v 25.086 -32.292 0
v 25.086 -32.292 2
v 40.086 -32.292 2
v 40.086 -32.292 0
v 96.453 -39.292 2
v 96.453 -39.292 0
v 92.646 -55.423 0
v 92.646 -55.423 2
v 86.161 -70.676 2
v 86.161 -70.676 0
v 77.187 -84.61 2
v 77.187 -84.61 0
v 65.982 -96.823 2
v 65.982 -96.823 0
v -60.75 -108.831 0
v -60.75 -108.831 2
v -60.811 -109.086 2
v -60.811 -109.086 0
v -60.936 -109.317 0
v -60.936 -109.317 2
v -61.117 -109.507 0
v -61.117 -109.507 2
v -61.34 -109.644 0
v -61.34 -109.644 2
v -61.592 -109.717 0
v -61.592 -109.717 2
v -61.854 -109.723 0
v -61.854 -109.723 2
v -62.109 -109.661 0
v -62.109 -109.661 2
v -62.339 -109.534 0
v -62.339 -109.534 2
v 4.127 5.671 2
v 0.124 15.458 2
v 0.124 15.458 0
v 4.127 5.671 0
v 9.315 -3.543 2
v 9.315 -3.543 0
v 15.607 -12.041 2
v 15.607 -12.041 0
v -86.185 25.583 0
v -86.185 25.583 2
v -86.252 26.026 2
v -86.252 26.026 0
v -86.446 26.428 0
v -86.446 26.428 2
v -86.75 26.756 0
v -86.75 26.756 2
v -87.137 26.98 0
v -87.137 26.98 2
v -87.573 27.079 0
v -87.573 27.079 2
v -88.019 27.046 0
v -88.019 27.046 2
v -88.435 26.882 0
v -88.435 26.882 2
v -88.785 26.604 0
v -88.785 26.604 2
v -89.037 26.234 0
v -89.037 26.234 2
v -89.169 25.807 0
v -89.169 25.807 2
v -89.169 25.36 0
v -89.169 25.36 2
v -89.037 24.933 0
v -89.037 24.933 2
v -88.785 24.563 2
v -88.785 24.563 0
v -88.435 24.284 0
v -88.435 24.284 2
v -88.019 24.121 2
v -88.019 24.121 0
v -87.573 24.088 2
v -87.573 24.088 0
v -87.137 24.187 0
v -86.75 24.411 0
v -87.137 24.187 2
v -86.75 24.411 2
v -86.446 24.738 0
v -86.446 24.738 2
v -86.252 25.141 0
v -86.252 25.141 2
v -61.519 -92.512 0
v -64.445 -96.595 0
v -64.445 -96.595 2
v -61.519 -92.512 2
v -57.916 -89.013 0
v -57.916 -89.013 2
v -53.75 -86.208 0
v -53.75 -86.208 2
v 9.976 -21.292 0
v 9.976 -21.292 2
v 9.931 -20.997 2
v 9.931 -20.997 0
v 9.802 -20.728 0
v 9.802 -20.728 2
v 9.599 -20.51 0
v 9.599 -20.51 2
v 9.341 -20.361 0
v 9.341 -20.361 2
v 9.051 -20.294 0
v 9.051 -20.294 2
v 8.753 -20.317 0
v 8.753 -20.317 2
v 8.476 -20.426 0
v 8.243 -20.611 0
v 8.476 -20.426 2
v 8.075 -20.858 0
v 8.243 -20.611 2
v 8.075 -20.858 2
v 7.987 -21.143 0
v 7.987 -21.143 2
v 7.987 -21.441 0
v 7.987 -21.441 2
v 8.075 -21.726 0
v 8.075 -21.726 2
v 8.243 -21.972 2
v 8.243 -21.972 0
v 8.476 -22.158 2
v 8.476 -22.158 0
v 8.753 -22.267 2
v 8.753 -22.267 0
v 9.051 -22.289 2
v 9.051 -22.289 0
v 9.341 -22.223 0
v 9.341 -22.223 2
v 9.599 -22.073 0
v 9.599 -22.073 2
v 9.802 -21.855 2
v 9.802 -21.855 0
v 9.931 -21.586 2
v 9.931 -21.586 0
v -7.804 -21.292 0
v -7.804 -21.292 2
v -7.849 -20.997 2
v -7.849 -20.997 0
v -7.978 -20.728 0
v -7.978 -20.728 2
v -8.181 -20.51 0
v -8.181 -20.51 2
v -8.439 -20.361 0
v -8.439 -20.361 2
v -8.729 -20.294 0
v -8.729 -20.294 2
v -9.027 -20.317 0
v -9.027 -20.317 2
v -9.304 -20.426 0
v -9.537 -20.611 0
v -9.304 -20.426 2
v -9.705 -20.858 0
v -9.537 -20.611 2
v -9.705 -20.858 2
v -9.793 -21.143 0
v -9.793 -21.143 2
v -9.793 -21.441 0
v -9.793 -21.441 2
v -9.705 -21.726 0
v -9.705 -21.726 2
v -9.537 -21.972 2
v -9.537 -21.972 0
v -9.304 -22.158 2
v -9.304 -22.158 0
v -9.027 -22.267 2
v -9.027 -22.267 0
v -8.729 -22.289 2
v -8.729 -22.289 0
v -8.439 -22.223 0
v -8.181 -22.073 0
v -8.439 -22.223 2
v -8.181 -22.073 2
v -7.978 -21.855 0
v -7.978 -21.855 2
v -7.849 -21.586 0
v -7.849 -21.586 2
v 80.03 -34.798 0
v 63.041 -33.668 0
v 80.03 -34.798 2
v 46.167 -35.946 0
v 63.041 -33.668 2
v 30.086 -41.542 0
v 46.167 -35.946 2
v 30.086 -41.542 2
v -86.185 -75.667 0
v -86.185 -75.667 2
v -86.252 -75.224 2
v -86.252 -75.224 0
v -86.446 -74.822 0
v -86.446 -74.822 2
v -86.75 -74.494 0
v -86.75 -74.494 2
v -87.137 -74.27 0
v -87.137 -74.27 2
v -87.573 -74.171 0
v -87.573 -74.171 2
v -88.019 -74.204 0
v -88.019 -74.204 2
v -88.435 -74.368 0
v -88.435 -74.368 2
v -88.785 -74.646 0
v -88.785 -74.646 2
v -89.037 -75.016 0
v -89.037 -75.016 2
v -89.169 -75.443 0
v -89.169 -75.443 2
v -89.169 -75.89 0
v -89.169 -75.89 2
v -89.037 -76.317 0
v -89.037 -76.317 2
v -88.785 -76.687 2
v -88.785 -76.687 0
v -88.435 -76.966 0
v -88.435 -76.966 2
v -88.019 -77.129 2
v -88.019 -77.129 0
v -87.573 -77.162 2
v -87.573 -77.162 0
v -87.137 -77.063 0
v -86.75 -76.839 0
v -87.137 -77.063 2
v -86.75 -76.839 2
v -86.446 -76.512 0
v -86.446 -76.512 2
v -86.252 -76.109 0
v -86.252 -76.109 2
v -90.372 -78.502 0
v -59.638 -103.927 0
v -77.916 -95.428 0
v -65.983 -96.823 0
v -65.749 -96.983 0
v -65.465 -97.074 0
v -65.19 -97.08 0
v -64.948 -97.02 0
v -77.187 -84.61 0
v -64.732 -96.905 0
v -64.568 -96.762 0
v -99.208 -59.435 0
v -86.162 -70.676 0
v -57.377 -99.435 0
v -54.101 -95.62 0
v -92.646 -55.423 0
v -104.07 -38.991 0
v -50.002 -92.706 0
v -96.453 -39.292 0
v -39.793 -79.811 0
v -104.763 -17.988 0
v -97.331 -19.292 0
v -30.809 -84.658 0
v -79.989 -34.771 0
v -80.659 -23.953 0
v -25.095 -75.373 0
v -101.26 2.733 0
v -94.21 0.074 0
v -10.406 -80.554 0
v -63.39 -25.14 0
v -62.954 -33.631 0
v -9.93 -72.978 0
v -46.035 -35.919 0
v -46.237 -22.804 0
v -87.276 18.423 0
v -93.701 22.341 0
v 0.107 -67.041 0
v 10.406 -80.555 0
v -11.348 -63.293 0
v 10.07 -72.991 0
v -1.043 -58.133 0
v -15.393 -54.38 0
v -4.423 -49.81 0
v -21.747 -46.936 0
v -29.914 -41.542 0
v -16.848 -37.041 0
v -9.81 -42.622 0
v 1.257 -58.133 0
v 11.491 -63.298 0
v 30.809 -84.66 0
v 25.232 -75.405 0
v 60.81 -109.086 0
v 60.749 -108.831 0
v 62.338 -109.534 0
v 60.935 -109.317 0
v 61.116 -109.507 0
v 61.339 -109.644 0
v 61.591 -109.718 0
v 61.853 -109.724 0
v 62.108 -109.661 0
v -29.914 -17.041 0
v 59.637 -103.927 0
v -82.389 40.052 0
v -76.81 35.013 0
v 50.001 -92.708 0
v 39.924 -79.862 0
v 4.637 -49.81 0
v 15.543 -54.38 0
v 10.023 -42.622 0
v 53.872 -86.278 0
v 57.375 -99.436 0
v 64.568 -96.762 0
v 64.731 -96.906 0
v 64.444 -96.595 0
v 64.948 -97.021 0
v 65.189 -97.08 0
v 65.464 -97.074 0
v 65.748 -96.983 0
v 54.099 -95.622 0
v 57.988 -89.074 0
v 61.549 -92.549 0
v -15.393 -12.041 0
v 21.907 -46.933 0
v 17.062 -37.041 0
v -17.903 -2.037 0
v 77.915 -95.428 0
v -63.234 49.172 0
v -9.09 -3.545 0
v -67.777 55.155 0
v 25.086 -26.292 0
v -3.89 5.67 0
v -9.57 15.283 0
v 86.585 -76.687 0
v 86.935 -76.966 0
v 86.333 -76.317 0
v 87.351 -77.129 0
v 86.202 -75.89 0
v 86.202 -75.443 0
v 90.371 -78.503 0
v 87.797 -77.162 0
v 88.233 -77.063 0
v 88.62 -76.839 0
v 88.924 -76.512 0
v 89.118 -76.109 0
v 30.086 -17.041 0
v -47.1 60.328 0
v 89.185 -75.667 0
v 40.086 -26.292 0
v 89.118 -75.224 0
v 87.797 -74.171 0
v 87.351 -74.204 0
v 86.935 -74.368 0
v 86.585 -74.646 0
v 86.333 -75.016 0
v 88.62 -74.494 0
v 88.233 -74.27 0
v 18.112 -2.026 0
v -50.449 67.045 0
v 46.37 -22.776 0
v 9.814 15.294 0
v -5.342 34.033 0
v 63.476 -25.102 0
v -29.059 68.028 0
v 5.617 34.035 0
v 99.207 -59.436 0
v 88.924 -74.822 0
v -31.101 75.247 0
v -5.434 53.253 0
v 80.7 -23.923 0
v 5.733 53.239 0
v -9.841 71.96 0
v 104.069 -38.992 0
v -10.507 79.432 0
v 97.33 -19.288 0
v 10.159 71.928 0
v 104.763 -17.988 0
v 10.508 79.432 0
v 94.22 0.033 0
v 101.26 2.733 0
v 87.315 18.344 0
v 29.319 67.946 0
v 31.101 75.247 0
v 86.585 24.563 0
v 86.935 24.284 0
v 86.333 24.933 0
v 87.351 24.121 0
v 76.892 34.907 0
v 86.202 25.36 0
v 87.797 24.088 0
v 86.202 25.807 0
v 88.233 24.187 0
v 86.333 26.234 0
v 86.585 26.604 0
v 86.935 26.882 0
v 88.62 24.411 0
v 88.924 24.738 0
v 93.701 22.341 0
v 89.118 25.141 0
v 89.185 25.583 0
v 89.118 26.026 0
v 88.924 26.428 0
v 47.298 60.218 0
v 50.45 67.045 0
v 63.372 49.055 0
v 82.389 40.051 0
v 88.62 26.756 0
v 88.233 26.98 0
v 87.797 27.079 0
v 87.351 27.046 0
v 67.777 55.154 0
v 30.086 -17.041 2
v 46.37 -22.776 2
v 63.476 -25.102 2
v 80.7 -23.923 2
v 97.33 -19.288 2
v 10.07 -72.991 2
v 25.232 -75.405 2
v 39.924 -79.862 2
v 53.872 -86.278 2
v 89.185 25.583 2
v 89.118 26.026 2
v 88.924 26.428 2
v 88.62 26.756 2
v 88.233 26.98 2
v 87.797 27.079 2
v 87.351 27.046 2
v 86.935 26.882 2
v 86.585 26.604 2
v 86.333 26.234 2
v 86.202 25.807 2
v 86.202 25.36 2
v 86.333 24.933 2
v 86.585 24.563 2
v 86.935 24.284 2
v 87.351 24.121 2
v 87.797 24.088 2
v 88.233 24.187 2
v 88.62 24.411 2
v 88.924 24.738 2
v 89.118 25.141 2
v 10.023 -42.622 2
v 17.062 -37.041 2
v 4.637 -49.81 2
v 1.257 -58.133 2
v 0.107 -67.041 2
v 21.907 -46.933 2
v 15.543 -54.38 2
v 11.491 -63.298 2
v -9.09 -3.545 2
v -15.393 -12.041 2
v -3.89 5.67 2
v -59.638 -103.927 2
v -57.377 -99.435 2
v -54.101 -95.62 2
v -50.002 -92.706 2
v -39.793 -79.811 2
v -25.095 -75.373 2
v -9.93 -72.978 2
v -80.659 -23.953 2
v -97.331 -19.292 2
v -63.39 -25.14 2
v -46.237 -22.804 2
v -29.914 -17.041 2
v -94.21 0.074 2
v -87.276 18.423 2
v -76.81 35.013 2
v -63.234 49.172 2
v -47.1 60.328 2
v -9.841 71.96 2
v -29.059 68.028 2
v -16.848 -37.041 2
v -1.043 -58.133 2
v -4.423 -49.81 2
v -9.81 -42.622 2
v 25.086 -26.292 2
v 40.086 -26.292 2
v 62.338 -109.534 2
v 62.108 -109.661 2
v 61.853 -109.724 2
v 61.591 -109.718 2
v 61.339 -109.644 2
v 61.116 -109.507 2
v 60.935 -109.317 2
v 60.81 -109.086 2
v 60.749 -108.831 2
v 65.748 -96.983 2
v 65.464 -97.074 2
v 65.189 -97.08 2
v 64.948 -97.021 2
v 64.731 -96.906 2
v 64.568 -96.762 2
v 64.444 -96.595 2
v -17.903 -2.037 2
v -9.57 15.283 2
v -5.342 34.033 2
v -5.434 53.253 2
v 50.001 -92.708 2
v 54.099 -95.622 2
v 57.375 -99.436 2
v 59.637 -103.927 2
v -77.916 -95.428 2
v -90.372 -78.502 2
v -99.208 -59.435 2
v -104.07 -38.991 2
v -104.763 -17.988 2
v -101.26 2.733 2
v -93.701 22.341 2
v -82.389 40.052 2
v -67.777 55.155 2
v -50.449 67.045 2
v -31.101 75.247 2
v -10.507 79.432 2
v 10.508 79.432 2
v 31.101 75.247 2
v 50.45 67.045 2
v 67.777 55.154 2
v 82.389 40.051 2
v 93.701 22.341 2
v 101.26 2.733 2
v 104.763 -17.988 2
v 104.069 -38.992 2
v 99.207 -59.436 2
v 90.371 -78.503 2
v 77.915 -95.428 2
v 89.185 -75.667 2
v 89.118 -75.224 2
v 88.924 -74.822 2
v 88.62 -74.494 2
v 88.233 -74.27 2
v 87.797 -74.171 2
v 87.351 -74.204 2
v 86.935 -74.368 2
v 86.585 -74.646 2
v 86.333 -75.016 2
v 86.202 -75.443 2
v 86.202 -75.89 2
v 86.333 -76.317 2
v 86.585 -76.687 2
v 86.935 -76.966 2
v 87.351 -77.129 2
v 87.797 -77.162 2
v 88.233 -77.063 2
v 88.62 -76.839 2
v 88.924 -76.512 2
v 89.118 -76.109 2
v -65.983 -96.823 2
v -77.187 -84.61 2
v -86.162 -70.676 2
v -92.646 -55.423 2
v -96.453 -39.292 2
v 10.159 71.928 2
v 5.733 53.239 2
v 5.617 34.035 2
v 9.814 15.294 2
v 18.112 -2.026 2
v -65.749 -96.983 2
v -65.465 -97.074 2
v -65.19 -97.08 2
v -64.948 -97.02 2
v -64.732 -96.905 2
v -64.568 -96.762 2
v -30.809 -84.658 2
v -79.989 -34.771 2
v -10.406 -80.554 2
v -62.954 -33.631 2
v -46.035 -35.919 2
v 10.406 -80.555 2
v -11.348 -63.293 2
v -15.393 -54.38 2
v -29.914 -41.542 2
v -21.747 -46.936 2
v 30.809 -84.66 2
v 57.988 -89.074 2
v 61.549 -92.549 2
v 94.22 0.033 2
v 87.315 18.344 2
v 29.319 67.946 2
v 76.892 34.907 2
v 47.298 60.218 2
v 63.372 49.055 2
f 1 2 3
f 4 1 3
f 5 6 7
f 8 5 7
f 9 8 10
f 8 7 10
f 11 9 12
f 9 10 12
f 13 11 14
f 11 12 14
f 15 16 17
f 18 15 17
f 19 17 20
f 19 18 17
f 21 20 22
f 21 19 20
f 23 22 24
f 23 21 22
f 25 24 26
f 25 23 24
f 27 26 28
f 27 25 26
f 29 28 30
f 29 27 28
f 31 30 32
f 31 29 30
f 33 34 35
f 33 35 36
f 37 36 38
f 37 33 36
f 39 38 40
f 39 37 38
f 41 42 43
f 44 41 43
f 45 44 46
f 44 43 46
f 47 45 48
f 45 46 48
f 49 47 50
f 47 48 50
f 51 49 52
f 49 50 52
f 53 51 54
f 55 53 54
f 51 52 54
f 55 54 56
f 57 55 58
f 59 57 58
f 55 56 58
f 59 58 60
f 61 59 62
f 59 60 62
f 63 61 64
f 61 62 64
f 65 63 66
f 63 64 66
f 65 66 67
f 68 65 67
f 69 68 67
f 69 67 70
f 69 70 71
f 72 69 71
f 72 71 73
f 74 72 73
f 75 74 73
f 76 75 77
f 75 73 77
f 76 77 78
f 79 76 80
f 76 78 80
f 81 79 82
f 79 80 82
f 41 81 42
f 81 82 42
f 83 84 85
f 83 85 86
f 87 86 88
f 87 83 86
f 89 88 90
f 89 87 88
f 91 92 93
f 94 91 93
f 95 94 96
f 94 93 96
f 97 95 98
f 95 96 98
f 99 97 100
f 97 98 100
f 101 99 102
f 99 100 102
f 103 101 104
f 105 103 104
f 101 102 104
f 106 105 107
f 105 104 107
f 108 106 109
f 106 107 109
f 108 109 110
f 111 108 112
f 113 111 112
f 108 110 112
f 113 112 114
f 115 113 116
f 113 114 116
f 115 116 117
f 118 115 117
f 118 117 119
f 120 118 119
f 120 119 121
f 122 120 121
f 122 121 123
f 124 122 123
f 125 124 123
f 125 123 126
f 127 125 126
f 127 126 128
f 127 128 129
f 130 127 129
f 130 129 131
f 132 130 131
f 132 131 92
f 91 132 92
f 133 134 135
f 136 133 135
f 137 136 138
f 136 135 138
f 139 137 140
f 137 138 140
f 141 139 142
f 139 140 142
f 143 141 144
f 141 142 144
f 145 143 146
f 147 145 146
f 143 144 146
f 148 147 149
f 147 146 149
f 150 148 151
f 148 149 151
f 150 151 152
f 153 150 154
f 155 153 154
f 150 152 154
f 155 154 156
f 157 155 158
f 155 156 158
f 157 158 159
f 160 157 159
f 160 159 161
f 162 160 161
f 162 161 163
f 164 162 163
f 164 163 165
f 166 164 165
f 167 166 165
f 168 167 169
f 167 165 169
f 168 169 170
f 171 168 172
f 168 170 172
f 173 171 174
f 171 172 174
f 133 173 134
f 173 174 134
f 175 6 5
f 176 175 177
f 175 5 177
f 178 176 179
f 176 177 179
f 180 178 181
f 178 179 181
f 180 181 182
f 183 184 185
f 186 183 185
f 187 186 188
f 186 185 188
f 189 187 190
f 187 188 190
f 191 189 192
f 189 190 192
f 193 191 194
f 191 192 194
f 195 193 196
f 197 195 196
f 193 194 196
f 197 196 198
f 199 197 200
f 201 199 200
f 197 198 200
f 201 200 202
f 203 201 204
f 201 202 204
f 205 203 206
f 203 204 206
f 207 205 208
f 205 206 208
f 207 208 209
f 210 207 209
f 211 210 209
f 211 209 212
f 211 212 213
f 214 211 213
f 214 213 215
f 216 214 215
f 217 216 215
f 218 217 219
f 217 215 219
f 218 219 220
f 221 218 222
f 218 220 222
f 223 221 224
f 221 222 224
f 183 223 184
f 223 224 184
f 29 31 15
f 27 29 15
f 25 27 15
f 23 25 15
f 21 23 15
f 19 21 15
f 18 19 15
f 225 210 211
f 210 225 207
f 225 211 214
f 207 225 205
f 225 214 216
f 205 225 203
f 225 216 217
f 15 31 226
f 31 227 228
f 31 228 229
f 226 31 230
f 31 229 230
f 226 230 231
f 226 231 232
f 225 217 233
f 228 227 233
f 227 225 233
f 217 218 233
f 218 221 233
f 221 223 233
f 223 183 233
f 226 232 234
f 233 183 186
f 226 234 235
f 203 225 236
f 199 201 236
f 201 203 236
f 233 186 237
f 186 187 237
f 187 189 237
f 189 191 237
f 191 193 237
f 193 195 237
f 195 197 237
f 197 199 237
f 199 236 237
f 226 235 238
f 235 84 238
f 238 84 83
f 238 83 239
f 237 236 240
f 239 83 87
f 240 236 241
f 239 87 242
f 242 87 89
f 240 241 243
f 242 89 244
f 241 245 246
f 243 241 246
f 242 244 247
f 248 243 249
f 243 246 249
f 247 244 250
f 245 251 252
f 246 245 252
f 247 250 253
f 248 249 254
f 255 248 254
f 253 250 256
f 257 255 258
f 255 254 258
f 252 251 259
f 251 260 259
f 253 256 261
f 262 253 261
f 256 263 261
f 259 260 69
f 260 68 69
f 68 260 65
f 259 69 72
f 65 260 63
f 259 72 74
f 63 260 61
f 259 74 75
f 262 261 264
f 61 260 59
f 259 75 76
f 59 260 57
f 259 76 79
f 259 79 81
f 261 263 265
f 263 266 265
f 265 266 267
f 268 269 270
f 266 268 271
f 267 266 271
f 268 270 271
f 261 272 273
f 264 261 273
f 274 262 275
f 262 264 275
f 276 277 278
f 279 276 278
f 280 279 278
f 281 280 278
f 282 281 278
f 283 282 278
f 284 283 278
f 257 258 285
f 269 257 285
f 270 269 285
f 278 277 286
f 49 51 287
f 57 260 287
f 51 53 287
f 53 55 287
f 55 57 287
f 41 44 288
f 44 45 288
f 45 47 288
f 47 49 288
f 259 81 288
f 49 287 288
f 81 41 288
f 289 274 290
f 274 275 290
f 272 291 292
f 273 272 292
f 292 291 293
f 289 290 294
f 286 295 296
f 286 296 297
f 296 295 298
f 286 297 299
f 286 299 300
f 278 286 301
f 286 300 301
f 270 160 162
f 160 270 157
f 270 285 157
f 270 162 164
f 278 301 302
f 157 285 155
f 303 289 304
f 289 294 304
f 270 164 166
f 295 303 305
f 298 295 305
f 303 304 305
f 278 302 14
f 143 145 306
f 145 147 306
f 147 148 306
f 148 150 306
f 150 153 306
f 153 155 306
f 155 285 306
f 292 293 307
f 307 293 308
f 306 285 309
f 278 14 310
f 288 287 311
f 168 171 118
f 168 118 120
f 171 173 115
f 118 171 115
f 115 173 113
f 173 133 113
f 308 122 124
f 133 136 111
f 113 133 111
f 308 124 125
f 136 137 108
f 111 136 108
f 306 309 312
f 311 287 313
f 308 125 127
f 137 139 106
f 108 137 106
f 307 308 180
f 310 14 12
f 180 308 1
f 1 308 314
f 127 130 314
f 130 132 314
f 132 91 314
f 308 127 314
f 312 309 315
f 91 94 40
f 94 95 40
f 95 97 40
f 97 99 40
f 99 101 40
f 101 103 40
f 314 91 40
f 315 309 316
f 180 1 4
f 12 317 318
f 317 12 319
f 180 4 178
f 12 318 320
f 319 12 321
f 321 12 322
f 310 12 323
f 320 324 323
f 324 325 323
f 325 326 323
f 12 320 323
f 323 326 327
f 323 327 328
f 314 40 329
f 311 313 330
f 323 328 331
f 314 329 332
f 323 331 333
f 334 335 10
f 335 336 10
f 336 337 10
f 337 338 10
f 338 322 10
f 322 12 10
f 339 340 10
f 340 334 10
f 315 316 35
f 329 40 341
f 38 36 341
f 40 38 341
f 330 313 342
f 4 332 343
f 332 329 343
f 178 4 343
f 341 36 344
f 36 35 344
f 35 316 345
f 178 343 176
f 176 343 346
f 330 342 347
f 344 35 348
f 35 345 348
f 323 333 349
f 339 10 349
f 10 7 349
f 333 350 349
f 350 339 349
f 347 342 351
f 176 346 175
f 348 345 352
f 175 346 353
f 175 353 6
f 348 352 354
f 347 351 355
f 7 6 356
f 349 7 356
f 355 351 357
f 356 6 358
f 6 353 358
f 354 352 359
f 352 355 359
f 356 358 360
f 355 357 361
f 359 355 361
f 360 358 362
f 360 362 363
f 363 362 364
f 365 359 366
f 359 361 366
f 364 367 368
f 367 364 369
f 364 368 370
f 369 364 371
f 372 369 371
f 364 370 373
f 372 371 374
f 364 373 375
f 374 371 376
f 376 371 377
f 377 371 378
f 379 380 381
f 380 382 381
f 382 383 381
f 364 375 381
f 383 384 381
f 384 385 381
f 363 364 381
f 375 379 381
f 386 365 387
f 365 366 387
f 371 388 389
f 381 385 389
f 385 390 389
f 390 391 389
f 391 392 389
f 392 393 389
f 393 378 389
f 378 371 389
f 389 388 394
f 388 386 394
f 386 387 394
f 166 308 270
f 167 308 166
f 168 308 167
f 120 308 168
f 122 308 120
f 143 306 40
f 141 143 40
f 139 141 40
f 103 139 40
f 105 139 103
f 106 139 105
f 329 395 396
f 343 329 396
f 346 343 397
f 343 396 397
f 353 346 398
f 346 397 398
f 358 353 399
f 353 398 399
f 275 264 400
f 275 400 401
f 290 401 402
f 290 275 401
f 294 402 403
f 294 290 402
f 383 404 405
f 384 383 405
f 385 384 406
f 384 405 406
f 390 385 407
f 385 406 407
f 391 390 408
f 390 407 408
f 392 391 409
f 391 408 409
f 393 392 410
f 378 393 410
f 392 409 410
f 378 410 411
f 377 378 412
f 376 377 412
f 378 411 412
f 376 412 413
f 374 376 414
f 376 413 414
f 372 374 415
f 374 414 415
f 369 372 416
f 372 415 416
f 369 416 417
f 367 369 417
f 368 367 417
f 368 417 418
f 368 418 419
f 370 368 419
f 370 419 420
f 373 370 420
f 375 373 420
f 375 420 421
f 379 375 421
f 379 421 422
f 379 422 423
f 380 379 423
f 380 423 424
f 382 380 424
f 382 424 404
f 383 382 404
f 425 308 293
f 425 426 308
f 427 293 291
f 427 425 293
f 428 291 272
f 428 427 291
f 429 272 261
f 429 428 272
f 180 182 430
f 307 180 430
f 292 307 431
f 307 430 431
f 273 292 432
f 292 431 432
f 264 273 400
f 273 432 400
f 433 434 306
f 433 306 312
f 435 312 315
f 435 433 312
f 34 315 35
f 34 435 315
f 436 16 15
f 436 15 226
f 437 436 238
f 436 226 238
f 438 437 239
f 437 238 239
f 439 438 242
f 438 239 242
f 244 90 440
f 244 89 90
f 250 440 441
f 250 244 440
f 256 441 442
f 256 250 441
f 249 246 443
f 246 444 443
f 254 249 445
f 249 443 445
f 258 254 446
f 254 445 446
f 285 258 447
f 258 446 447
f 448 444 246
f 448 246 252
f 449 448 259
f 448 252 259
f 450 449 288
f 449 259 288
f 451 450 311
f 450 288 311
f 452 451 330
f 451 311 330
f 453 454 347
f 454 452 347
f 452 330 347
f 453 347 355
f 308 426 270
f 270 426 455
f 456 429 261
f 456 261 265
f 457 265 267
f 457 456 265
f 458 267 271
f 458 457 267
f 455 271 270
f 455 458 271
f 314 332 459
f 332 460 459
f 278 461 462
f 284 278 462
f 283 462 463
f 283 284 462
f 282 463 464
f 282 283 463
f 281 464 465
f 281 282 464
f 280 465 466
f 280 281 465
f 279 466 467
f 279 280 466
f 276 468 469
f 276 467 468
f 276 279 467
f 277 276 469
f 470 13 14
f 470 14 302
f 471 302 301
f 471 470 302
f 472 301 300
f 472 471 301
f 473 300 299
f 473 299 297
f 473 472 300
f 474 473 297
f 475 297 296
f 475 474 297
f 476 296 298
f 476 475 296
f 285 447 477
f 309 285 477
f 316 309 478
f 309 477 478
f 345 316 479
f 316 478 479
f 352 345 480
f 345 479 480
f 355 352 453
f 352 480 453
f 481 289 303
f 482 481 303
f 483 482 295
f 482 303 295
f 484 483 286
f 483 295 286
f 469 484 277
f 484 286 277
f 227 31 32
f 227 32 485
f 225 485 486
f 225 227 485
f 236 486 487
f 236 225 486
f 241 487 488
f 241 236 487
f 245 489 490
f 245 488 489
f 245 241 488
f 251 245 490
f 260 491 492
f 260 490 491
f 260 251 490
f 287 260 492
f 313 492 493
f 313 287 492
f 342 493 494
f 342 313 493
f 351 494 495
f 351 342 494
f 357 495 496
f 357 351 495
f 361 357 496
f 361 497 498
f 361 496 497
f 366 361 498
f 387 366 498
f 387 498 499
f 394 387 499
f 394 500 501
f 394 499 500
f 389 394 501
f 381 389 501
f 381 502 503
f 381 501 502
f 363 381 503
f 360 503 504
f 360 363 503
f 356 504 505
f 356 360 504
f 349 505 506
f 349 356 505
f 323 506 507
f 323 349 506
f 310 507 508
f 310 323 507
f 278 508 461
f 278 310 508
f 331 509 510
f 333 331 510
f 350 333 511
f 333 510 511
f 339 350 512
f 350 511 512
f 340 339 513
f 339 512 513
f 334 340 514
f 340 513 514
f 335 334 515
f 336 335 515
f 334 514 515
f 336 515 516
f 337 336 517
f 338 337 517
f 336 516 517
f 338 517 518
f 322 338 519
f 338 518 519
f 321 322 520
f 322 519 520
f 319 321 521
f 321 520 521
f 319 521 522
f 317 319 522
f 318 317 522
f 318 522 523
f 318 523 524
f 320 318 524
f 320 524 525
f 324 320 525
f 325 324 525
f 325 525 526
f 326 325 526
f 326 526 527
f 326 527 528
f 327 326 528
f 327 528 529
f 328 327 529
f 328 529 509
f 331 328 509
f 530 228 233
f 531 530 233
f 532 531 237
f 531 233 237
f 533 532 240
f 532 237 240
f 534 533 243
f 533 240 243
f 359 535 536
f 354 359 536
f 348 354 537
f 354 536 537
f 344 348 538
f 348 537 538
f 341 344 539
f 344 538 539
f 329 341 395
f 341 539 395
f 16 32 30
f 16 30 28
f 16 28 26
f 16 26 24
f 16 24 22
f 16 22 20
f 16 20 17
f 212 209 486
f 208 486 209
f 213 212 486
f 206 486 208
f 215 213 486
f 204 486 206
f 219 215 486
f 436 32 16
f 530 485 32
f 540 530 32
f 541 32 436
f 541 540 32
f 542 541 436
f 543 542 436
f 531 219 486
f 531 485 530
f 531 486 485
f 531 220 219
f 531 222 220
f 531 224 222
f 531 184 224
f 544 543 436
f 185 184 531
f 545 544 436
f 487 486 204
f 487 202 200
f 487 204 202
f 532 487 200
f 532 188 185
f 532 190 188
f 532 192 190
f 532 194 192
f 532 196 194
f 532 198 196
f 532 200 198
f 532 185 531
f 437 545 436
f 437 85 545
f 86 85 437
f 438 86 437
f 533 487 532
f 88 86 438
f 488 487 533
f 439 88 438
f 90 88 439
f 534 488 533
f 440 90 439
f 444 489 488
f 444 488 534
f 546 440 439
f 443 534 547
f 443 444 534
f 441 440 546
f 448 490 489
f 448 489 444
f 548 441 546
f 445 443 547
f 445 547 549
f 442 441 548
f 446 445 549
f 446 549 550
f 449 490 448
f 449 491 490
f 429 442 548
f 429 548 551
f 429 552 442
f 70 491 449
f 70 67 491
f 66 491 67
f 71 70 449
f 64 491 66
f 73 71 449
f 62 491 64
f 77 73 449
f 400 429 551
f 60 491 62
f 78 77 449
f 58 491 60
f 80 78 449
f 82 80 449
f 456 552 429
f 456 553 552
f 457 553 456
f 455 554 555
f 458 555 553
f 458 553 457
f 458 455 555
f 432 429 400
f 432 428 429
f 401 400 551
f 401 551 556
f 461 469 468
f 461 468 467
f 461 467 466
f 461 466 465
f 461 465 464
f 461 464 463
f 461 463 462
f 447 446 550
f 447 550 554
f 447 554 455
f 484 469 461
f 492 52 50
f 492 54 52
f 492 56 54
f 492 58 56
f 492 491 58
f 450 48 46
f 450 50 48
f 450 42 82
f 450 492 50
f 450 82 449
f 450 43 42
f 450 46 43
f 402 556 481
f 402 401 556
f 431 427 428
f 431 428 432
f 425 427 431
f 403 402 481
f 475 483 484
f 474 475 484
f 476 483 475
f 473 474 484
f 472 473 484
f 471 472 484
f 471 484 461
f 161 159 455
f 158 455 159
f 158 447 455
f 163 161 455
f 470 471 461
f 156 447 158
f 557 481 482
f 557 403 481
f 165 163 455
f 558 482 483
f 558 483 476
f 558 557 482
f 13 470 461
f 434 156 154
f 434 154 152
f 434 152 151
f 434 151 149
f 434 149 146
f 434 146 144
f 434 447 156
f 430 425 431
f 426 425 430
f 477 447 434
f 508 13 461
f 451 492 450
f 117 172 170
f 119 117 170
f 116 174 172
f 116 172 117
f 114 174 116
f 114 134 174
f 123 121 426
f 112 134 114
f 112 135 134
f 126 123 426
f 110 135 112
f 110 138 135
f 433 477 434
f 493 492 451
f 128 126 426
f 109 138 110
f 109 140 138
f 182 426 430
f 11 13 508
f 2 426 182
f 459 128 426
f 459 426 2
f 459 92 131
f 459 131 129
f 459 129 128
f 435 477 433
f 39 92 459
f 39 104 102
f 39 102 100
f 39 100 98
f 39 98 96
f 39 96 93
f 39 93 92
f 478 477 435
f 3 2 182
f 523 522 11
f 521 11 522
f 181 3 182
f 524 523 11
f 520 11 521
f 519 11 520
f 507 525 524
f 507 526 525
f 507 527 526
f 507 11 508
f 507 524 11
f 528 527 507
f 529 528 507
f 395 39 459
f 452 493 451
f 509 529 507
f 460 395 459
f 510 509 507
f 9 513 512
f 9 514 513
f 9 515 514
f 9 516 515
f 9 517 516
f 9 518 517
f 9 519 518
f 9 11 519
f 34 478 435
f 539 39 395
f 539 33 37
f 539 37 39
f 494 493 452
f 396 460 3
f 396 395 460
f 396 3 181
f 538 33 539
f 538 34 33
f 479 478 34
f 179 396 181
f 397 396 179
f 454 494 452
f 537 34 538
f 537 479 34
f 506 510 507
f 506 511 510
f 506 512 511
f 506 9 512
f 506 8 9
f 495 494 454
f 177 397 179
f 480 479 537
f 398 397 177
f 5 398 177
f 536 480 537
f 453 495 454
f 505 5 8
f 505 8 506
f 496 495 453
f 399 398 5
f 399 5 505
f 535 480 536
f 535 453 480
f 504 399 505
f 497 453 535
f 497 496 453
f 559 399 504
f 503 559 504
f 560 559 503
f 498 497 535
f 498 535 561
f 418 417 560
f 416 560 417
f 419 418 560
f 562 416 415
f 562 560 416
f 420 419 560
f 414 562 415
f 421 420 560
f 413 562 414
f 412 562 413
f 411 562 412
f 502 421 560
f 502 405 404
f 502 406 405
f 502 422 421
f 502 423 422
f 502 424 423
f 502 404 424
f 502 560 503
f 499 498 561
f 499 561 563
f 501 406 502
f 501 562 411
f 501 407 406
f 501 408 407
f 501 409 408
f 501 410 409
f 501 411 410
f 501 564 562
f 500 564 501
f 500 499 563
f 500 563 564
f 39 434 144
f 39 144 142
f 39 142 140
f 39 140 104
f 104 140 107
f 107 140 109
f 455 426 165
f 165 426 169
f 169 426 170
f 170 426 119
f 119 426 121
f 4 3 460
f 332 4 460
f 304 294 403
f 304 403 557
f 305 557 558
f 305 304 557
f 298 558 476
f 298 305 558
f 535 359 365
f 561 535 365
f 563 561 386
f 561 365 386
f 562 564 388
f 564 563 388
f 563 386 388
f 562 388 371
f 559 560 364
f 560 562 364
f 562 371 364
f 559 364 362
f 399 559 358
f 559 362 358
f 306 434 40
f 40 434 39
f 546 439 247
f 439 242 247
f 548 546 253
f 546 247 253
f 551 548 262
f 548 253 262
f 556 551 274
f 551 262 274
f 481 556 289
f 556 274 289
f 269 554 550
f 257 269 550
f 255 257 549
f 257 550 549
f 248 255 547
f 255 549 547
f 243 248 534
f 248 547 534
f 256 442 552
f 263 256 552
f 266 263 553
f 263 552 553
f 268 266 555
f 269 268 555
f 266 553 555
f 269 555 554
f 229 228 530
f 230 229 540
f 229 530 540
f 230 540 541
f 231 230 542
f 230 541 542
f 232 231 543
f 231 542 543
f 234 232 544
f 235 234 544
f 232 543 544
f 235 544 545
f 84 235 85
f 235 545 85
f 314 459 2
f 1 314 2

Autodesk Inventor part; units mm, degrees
ref_plane "YZ Plane" through (0, 0, 0) normal (1, 0, 0) x (0, 1, 0)
ref_plane "XZ Plane" through (0, 0, 0) normal (0, 1, 0) x (-1, 0, 0)
ref_plane "XY Plane" through (0, 0, 0) normal (0, 0, 1) x (1, 0, 0)
sketch "Sketch1" plane through (0, 0, 0) normal (0, 0, 1) x (1, 0, 0)
  arc A0 (62.337932, -109.534374) -> (-62.338968, -109.533936) centre (-0.000221, -25.04158) ccw
  arc A1 (-62.338968, -109.533936) -> (-60.750413, -108.830564) centre (-61.745267, -108.72925) ccw
  arc A2 (-50.002249, -92.706201) -> (-60.750413, -108.830564) centre (-40.131347, -110.93037) ccw
  arc A3 (50.001023, -92.708465) -> (-50.002249, -92.706201) centre (-0.002704, -185.038808) ccw
  arc A4 (60.74939, -108.831068) -> (62.337932, -109.534374) centre (61.744237, -108.729684) ccw
  arc A5 (60.74939, -108.831068) -> (50.001023, -92.708465) centre (40.131464, -110.932229) ccw
  arc A6 (53.872108, -86.277709) -> (-53.749901, -86.208202) centre (-0.002704, -185.038808) ccw construction
  arc A7 (65.047278, -97.671277) -> (53.872108, -86.277709) centre (40.131464, -110.932229) ccw construction
  arc A8 (65.047278, -97.671277) -> (-65.048011, -97.671016) centre (-0.000221, -25.04158) ccw construction
  arc A9 (-53.749901, -86.208202) -> (-65.048011, -97.671016) centre (-40.131347, -110.93037) ccw construction
  arc A10 (65.047278, -97.671277) -> (-65.048011, -97.671016) centre (-0.000221, -25.04158) ccw
  arc A11 (-53.749901, -86.208202) -> (-65.048011, -97.671016) centre (-40.131347, -110.93037) ccw
  arc A12 (53.872108, -86.277709) -> (-53.749901, -86.208202) centre (-0.002704, -185.038808) ccw
  arc A13 (65.047278, -97.671277) -> (53.872108, -86.277709) centre (40.131464, -110.932229) ccw
  point P0 (0, 0)
extrude "Extrusion1" add sketch "Sketch1" along normal blind 2
fillet "Fillet1" radius 1 2 edges at (-65.048, -97.671, 1) (65.0473, -97.6713, 1)
sketch "Sketch2" plane through (0, 0, 2) normal (0, 0, 1) x (1, 0, 0)
  arc A0 (65.981978, -96.82319) -> (-65.982771, -96.822866) centre (-0.000221, -25.04158) ccw construction
  circle A1 centre (-0.000221, -25.04158) radius 101.25 construction
  line L0 (-0.000221, -25.04158) -> (-87.685293, 25.58342) construction
  line L1 (-0.000221, -25.04158) -> (101.249779, -25.04158) construction
  line L2 (-0.000221, -25.04158) -> (87.684851, 25.58342) construction
  line L3 (-0.000221, -25.04158) -> (-87.685293, -75.66658) construction
  line L4 (-0.000221, -25.04158) -> (101.249779, -25.04158) construction
  line L5 (-0.000221, -25.04158) -> (87.684851, -75.66658) construction
  line L6 (-0.000221, -25.04158) -> (101.249779, -25.04158) construction
  line L7 (-0.000221, -25.04158) -> (101.249779, -25.04158) construction
  circle A2 centre (87.684851, 25.58342) radius 1.5
  circle A3 centre (87.684851, -75.66658) radius 1.5
  circle A4 centre (-87.685293, -75.66658) radius 1.5
  circle A5 centre (-87.685293, 25.58342) radius 1.5
  line L8 (-0.000221, -25.04158) -> (-0.000221, -72.538808) construction
  arc A6 (53.872108, -86.277709) -> (-53.749901, -86.208202) centre (-0.002704, -185.038808) ccw construction
  line L9 (-0.000221, -72.538808) -> (-0.000221, -80.037547) construction
  arc A7 (50.001023, -92.708465) -> (-50.002249, -92.706201) centre (-0.002704, -185.038808) ccw construction
  circle A8 centre (-0.000221, -76.288177) radius 1.5
  point P0 (0, 0)
  dimension "d7" = 202.5
  dimension "d8" = 150
  dimension "d9" = 150
  dimension "d10" = 30
  dimension "d14" = 3
  dimension "d15" = 3
  dimension "d16" = 3
  dimension "d17" = 3
  dimension "d18" = 3
extrude "Extrusion3" cut sketch "Sketch2" against normal up to next contours A2 | A3 | A4 | A5
sketch "Sketch3" plane through (0, 0, 2) normal (0, 0, 1) x (1, 0, 0)
  arc A0 (10.069954, -72.990642) -> (-9.930046, -72.977674) centre (-0.002704, -185.038808) ccw
  line L0 (0.08586, -41.541785) -> (-29.91414, -41.541785) construction
  line L1 (-29.91414, -41.541785) -> (30.08586, -41.541785) construction
  line L2 (30.08586, -41.541785) -> (30.08586, -17.041498) construction
  line L3 (30.08586, -17.041498) -> (-29.91414, -17.041498) construction
  line L4 (-29.91414, -17.041498) -> (-29.91414, -41.541785) construction
  line L5 (30.08586, -29.291641) -> (97.407104, -29.291641) construction
  line L6 (30.08586, -29.291641) -> (97.407104, -29.291641) construction
  line L7 (-29.91414, -29.291641) -> (-97.407546, -29.291641) construction
  line L8 (0.069954, -72.538832) -> (0.213372, 161.863698) construction
  line L9 (-29.91414, -29.291641) -> (30.08586, -29.291641) construction
  line L10 (0.08586, -29.291641) -> (-8.80414, -29.291641) construction
  line L11 (0.08586, -29.291641) -> (8.97586, -29.291641) construction
  line L12 (-8.80414, -29.291641) -> (8.97586, -29.291641)
  arc A1 (30.08586, -41.541785) -> (10.069954, -72.990642) centre (45.069483, -73.172325) ccw
  arc A2 (-9.930046, -72.977674) -> (-29.91414, -41.541785) centre (-44.929585, -73.15723) ccw
  arc A3 (96.452803, -39.291641) -> (30.08586, -41.541785) centre (65.920739, -118.618769) ccw
  line L13 (-97.407546, -29.291641) -> (-87.407546, -29.291641) construction
  arc A4 (-29.91414, -41.541785) -> (-96.453245, -39.291641) centre (-65.827012, -118.58246) ccw
  line L14 (-97.407546, -29.291641) -> (-87.407546, -29.291641) construction
  arc A5 (-97.330526, -19.291641) -> (-29.91414, -17.041498) centre (-66.225021, 59.812389) ccw
  arc A6 (30.08586, -17.041498) -> (97.329893, -19.288417) centre (66.314736, 59.85108) ccw
  arc A7 (10.15867, 71.927729) -> (30.08586, -17.041498) centre (90.129276, 43.123178) ccw
  arc A8 (-29.91414, -17.041498) -> (-9.84133, 71.960495) centre (-89.841664, 43.238613) ccw
  line L15 (0.10391, -17.041498) -> (0.106969, -12.041499)
  line L16 (0.106969, -12.041499) -> (0.123795, 15.458496) construction
  line L17 (0.106969, -12.041499) -> (15.606969, -12.041499) construction
  line L18 (0.106969, -12.041499) -> (-15.393031, -12.041499) construction
  arc A9 (-15.393031, -12.041499) -> (0.123795, 15.458496) centre (-80.375006, 42.75214) ccw construction
  arc A10 (0.123795, 15.458496) -> (15.606969, -12.041499) centre (80.645215, 42.685337) ccw construction
  line L19 (-15.393031, -12.041499) -> (15.606969, -12.041499)
  arc A11 (-15.393031, -12.041499) -> (0.123795, 15.458496) centre (-80.375006, 42.75214) ccw
  arc A12 (0.123795, 15.458496) -> (15.606969, -12.041499) centre (80.645215, 42.685337) ccw
  line L20 (0.08586, -41.541785) -> (0.08586, -46.541785)
  line L21 (0.08586, -41.541785) -> (5.08586, -41.541785) construction
  arc A13 (96.452803, -39.291641) -> (97.329893, -19.288417) centre (-0.000221, -25.04158) ccw
  arc A14 (10.15867, 71.927729) -> (-9.84133, 71.960495) centre (-0.000221, -25.04158) ccw
  arc A15 (-97.330526, -19.291641) -> (-96.453245, -39.291641) centre (-0.000221, -25.04158) ccw
  line L22 (-29.91414, -29.291641) -> (-29.91414, -34.291641) construction
  line L23 (8.97586, -29.291641) -> (8.97586, -21.291641)
  line L24 (-8.80414, -29.291641) -> (-8.80414, -21.291641)
  circle A16 centre (-8.80414, -21.291641) radius 1
  circle A17 centre (8.97586, -21.291641) radius 1
  point P0 (0, 0)
  dimension "d30" = 30
  dimension "d31" = 60
  dimension "d43" = 8.89
  dimension "d44" = 180
  dimension "d46" = 17.78
  dimension "d55" = 35
  dimension "d56" = 35
  dimension "d60" = 85
  dimension "d63" = 85
  dimension "d66" = 85
  dimension "d67" = 85
  dimension "d72" = 85
  dimension "d73" = 85
  dimension "d74" = 5
  dimension "d75" = 27.5
  dimension "d76" = 15.5
  dimension "d77" = 15.5
  dimension "d78" = 85
  dimension "d79" = 85
  dimension "d80" = 5
  dimension "d81" = 90
  dimension "d89" = 5
  dimension "d109" = 8
  dimension "d110" = 8
  dimension "d111" = 2
  dimension "d112" = 2
sketch "Sketch6" plane through (0, 0, 2) normal (0, 0, 1) x (1, 0, 0)
  arc A0 (53.872108, -86.277709) -> (-53.749901, -86.208202) centre (-0.002704, -185.038808) ccw
  arc A1 (-53.749901, -86.208202) -> (-64.444618, -96.59456) centre (-40.131347, -110.93037) ccw
  arc A2 (-65.982771, -96.822866) -> (-64.444618, -96.59456) centre (-65.306027, -96.086648) ccw
  arc A3 (65.981978, -96.82319) -> (-65.982771, -96.822866) centre (-0.000221, -25.04158) ccw
  arc A4 (64.443859, -96.594932) -> (65.981978, -96.82319) centre (65.305237, -96.086968) ccw
  arc A5 (64.443859, -96.594932) -> (53.872108, -86.277709) centre (40.131464, -110.932229) ccw
  circle A6 centre (-87.685293, -75.66658) radius 1.5
  circle A7 centre (87.684851, 25.58342) radius 1.5
  circle A8 centre (87.684851, -75.66658) radius 1.5
  circle A9 centre (-87.685293, 25.58342) radius 1.5
  arc A10 (62.337932, -109.534374) -> (-62.338968, -109.533936) centre (-0.000221, -25.04158) ccw
  arc A11 (-62.338968, -109.533936) -> (-60.750413, -108.830564) centre (-61.745267, -108.72925) ccw
  arc A12 (-50.002249, -92.706201) -> (-60.750413, -108.830564) centre (-40.131347, -110.93037) ccw
  arc A13 (50.001023, -92.708465) -> (-50.002249, -92.706201) centre (-0.002704, -185.038808) ccw
  arc A14 (60.74939, -108.831068) -> (50.001023, -92.708465) centre (40.131464, -110.932229) ccw
  arc A15 (60.74939, -108.831068) -> (62.337932, -109.534374) centre (61.744237, -108.729684) ccw
  line L0 (-8.80414, -29.291641) -> (8.97586, -29.291641)
  line L1 (0.08586, -29.291641) -> (20.08586, -29.291641)
  line L2 (20.08586, -29.291641) -> (25.08586, -29.291641)
  line L3 (25.08586, -29.291641) -> (25.08586, -26.291641)
  line L4 (25.08586, -26.291641) -> (25.08586, -32.291641)
  line L5 (25.08586, -32.291641) -> (40.08586, -32.291641)
  line L6 (40.08586, -32.291641) -> (40.08586, -26.291641)
  line L7 (40.08586, -26.291641) -> (25.08586, -26.291641)
  point P0 (0, 0)
  dimension "d101" = 20
  dimension "d102" = 5
  dimension "d103" = 3
  dimension "d104" = 6
  dimension "d105" = 15
  dimension "d106" = 6
extrude "Extrusion9" add sketch "Sketch3" against normal blind 2
extrude "Extrusion10" cut sketch "Sketch6" against normal blind 2 contours L3 L7 L6 L5 L4
sketch "Sketch7" plane through (0, 0, 2) normal (0, 0, 1) x (1, 0, 0)
  line L0 (40.08586, -32.291641) -> (25.08586, -32.291641)
  line L1 (25.08586, -32.291641) -> (25.08586, -26.291641)
  line L2 (25.08586, -26.291641) -> (40.08586, -26.291641)
  line L3 (40.08586, -26.291641) -> (40.08586, -32.291641)
  arc A0 (-9.930046, -72.977674) -> (-53.749901, -86.208202) centre (-0.002704, -185.038808) ccw
  arc A1 (-53.749901, -86.208202) -> (-64.444618, -96.59456) centre (-40.131347, -110.93037) ccw
  arc A2 (-65.982771, -96.822866) -> (-64.444618, -96.59456) centre (-65.306027, -96.086648) ccw
  arc A3 (-96.453245, -39.291641) -> (-65.982771, -96.822866) centre (-0.000221, -25.04158) ccw
  arc A4 (-29.91414, -41.541785) -> (-96.453245, -39.291641) centre (-65.827012, -118.58246) ccw
  arc A5 (-9.930046, -72.977674) -> (-29.91414, -41.541785) centre (-44.929585, -73.15723) ccw
  arc A6 (30.08586, -41.541785) -> (10.069954, -72.990642) centre (45.069483, -73.172325) ccw
  arc A7 (96.452803, -39.291641) -> (30.08586, -41.541785) centre (65.920739, -118.618769) ccw
  arc A8 (65.981978, -96.82319) -> (96.452803, -39.291641) centre (-0.000221, -25.04158) ccw
  arc A9 (64.443859, -96.594932) -> (65.981978, -96.82319) centre (65.305237, -96.086968) ccw
  arc A10 (64.443859, -96.594932) -> (53.872108, -86.277709) centre (40.131464, -110.932229) ccw
  arc A11 (53.872108, -86.277709) -> (10.069954, -72.990642) centre (-0.002704, -185.038808) ccw
  arc A12 (30.08586, -17.041498) -> (97.329893, -19.288417) centre (66.314736, 59.85108) ccw
  arc A13 (10.15867, 71.927729) -> (30.08586, -17.041498) centre (90.129276, 43.123178) ccw
  arc A14 (97.329893, -19.288417) -> (10.15867, 71.927729) centre (-0.000221, -25.04158) ccw
  circle A15 centre (-8.80414, -21.291641) radius 1
  circle A16 centre (8.97586, -21.291641) radius 1
  line L4 (15.606969, -12.041499) -> (-15.393031, -12.041499)
  arc A17 (-15.393031, -12.041499) -> (0.123795, 15.458496) centre (-80.375006, 42.75214) ccw
  arc A18 (0.123795, 15.458496) -> (15.606969, -12.041499) centre (80.645215, 42.685337) ccw
  circle A19 centre (-87.685293, -75.66658) radius 1.5
  circle A20 centre (87.684851, 25.58342) radius 1.5
  circle A21 centre (87.684851, -75.66658) radius 1.5
  circle A22 centre (-87.685293, 25.58342) radius 1.5
  arc A23 (-29.91414, -17.041498) -> (-9.84133, 71.960495) centre (-89.841664, 43.238613) ccw
  arc A24 (-97.330526, -19.291641) -> (-29.91414, -17.041498) centre (-66.225021, 59.812389) ccw
  arc A25 (-9.84133, 71.960495) -> (-97.330526, -19.291641) centre (-0.000221, -25.04158) ccw
  arc A26 (62.337932, -109.534374) -> (-62.338968, -109.533936) centre (-0.000221, -25.04158) ccw
  arc A27 (-62.338968, -109.533936) -> (-60.750413, -108.830564) centre (-61.745267, -108.72925) ccw
  arc A28 (-50.002249, -92.706201) -> (-60.750413, -108.830564) centre (-40.131347, -110.93037) ccw
  arc A29 (50.001023, -92.708465) -> (-50.002249, -92.706201) centre (-0.002704, -185.038808) ccw
  arc A30 (60.74939, -108.831068) -> (50.001023, -92.708465) centre (40.131464, -110.932229) ccw
  arc A31 (60.74939, -108.831068) -> (62.337932, -109.534374) centre (61.744237, -108.729684) ccw
  line L5 (15.606969, -12.041499) -> (-15.393031, -12.041499)
  line L6 (0.106969, -12.041499) -> (0.106969, -37.041499)
  line L7 (-16.848413, -37.041499) -> (17.062352, -37.041499)
  line L8 (0.106969, -37.041499) -> (0.106969, -67.041499)
  arc A32 (0.106969, -67.041499) -> (-16.848413, -37.041499) centre (-34.893029, -67.031361) ccw
  arc A33 (17.062352, -37.041499) -> (0.106969, -67.041499) centre (35.106968, -67.031361) ccw
  point P0 (0, 0)
  dimension "d117" = 25
  dimension "d118" = 30
  dimension "d119" = 35
  dimension "d120" = 35
  dimension "d123" = 25
sketch "Sketch7 outline for Extrusion11" plane through (0, 0, 2) normal (0, 0, 1) x (1, 0, 0)
  arc A0 (-16.848413, -37.041499) -> (0.106969, -67.041499) centre (-34.893029, -67.031361) cw
  line L0 (17.062352, -37.041499) -> (-16.848413, -37.041499)
  arc A1 (0.106969, -67.041499) -> (17.062352, -37.041499) centre (35.106968, -67.031361) cw
extrude "Extrusion11" cut sketch "Sketch7 outline for Extrusion11" against normal blind 2
properties part number "Handle"
